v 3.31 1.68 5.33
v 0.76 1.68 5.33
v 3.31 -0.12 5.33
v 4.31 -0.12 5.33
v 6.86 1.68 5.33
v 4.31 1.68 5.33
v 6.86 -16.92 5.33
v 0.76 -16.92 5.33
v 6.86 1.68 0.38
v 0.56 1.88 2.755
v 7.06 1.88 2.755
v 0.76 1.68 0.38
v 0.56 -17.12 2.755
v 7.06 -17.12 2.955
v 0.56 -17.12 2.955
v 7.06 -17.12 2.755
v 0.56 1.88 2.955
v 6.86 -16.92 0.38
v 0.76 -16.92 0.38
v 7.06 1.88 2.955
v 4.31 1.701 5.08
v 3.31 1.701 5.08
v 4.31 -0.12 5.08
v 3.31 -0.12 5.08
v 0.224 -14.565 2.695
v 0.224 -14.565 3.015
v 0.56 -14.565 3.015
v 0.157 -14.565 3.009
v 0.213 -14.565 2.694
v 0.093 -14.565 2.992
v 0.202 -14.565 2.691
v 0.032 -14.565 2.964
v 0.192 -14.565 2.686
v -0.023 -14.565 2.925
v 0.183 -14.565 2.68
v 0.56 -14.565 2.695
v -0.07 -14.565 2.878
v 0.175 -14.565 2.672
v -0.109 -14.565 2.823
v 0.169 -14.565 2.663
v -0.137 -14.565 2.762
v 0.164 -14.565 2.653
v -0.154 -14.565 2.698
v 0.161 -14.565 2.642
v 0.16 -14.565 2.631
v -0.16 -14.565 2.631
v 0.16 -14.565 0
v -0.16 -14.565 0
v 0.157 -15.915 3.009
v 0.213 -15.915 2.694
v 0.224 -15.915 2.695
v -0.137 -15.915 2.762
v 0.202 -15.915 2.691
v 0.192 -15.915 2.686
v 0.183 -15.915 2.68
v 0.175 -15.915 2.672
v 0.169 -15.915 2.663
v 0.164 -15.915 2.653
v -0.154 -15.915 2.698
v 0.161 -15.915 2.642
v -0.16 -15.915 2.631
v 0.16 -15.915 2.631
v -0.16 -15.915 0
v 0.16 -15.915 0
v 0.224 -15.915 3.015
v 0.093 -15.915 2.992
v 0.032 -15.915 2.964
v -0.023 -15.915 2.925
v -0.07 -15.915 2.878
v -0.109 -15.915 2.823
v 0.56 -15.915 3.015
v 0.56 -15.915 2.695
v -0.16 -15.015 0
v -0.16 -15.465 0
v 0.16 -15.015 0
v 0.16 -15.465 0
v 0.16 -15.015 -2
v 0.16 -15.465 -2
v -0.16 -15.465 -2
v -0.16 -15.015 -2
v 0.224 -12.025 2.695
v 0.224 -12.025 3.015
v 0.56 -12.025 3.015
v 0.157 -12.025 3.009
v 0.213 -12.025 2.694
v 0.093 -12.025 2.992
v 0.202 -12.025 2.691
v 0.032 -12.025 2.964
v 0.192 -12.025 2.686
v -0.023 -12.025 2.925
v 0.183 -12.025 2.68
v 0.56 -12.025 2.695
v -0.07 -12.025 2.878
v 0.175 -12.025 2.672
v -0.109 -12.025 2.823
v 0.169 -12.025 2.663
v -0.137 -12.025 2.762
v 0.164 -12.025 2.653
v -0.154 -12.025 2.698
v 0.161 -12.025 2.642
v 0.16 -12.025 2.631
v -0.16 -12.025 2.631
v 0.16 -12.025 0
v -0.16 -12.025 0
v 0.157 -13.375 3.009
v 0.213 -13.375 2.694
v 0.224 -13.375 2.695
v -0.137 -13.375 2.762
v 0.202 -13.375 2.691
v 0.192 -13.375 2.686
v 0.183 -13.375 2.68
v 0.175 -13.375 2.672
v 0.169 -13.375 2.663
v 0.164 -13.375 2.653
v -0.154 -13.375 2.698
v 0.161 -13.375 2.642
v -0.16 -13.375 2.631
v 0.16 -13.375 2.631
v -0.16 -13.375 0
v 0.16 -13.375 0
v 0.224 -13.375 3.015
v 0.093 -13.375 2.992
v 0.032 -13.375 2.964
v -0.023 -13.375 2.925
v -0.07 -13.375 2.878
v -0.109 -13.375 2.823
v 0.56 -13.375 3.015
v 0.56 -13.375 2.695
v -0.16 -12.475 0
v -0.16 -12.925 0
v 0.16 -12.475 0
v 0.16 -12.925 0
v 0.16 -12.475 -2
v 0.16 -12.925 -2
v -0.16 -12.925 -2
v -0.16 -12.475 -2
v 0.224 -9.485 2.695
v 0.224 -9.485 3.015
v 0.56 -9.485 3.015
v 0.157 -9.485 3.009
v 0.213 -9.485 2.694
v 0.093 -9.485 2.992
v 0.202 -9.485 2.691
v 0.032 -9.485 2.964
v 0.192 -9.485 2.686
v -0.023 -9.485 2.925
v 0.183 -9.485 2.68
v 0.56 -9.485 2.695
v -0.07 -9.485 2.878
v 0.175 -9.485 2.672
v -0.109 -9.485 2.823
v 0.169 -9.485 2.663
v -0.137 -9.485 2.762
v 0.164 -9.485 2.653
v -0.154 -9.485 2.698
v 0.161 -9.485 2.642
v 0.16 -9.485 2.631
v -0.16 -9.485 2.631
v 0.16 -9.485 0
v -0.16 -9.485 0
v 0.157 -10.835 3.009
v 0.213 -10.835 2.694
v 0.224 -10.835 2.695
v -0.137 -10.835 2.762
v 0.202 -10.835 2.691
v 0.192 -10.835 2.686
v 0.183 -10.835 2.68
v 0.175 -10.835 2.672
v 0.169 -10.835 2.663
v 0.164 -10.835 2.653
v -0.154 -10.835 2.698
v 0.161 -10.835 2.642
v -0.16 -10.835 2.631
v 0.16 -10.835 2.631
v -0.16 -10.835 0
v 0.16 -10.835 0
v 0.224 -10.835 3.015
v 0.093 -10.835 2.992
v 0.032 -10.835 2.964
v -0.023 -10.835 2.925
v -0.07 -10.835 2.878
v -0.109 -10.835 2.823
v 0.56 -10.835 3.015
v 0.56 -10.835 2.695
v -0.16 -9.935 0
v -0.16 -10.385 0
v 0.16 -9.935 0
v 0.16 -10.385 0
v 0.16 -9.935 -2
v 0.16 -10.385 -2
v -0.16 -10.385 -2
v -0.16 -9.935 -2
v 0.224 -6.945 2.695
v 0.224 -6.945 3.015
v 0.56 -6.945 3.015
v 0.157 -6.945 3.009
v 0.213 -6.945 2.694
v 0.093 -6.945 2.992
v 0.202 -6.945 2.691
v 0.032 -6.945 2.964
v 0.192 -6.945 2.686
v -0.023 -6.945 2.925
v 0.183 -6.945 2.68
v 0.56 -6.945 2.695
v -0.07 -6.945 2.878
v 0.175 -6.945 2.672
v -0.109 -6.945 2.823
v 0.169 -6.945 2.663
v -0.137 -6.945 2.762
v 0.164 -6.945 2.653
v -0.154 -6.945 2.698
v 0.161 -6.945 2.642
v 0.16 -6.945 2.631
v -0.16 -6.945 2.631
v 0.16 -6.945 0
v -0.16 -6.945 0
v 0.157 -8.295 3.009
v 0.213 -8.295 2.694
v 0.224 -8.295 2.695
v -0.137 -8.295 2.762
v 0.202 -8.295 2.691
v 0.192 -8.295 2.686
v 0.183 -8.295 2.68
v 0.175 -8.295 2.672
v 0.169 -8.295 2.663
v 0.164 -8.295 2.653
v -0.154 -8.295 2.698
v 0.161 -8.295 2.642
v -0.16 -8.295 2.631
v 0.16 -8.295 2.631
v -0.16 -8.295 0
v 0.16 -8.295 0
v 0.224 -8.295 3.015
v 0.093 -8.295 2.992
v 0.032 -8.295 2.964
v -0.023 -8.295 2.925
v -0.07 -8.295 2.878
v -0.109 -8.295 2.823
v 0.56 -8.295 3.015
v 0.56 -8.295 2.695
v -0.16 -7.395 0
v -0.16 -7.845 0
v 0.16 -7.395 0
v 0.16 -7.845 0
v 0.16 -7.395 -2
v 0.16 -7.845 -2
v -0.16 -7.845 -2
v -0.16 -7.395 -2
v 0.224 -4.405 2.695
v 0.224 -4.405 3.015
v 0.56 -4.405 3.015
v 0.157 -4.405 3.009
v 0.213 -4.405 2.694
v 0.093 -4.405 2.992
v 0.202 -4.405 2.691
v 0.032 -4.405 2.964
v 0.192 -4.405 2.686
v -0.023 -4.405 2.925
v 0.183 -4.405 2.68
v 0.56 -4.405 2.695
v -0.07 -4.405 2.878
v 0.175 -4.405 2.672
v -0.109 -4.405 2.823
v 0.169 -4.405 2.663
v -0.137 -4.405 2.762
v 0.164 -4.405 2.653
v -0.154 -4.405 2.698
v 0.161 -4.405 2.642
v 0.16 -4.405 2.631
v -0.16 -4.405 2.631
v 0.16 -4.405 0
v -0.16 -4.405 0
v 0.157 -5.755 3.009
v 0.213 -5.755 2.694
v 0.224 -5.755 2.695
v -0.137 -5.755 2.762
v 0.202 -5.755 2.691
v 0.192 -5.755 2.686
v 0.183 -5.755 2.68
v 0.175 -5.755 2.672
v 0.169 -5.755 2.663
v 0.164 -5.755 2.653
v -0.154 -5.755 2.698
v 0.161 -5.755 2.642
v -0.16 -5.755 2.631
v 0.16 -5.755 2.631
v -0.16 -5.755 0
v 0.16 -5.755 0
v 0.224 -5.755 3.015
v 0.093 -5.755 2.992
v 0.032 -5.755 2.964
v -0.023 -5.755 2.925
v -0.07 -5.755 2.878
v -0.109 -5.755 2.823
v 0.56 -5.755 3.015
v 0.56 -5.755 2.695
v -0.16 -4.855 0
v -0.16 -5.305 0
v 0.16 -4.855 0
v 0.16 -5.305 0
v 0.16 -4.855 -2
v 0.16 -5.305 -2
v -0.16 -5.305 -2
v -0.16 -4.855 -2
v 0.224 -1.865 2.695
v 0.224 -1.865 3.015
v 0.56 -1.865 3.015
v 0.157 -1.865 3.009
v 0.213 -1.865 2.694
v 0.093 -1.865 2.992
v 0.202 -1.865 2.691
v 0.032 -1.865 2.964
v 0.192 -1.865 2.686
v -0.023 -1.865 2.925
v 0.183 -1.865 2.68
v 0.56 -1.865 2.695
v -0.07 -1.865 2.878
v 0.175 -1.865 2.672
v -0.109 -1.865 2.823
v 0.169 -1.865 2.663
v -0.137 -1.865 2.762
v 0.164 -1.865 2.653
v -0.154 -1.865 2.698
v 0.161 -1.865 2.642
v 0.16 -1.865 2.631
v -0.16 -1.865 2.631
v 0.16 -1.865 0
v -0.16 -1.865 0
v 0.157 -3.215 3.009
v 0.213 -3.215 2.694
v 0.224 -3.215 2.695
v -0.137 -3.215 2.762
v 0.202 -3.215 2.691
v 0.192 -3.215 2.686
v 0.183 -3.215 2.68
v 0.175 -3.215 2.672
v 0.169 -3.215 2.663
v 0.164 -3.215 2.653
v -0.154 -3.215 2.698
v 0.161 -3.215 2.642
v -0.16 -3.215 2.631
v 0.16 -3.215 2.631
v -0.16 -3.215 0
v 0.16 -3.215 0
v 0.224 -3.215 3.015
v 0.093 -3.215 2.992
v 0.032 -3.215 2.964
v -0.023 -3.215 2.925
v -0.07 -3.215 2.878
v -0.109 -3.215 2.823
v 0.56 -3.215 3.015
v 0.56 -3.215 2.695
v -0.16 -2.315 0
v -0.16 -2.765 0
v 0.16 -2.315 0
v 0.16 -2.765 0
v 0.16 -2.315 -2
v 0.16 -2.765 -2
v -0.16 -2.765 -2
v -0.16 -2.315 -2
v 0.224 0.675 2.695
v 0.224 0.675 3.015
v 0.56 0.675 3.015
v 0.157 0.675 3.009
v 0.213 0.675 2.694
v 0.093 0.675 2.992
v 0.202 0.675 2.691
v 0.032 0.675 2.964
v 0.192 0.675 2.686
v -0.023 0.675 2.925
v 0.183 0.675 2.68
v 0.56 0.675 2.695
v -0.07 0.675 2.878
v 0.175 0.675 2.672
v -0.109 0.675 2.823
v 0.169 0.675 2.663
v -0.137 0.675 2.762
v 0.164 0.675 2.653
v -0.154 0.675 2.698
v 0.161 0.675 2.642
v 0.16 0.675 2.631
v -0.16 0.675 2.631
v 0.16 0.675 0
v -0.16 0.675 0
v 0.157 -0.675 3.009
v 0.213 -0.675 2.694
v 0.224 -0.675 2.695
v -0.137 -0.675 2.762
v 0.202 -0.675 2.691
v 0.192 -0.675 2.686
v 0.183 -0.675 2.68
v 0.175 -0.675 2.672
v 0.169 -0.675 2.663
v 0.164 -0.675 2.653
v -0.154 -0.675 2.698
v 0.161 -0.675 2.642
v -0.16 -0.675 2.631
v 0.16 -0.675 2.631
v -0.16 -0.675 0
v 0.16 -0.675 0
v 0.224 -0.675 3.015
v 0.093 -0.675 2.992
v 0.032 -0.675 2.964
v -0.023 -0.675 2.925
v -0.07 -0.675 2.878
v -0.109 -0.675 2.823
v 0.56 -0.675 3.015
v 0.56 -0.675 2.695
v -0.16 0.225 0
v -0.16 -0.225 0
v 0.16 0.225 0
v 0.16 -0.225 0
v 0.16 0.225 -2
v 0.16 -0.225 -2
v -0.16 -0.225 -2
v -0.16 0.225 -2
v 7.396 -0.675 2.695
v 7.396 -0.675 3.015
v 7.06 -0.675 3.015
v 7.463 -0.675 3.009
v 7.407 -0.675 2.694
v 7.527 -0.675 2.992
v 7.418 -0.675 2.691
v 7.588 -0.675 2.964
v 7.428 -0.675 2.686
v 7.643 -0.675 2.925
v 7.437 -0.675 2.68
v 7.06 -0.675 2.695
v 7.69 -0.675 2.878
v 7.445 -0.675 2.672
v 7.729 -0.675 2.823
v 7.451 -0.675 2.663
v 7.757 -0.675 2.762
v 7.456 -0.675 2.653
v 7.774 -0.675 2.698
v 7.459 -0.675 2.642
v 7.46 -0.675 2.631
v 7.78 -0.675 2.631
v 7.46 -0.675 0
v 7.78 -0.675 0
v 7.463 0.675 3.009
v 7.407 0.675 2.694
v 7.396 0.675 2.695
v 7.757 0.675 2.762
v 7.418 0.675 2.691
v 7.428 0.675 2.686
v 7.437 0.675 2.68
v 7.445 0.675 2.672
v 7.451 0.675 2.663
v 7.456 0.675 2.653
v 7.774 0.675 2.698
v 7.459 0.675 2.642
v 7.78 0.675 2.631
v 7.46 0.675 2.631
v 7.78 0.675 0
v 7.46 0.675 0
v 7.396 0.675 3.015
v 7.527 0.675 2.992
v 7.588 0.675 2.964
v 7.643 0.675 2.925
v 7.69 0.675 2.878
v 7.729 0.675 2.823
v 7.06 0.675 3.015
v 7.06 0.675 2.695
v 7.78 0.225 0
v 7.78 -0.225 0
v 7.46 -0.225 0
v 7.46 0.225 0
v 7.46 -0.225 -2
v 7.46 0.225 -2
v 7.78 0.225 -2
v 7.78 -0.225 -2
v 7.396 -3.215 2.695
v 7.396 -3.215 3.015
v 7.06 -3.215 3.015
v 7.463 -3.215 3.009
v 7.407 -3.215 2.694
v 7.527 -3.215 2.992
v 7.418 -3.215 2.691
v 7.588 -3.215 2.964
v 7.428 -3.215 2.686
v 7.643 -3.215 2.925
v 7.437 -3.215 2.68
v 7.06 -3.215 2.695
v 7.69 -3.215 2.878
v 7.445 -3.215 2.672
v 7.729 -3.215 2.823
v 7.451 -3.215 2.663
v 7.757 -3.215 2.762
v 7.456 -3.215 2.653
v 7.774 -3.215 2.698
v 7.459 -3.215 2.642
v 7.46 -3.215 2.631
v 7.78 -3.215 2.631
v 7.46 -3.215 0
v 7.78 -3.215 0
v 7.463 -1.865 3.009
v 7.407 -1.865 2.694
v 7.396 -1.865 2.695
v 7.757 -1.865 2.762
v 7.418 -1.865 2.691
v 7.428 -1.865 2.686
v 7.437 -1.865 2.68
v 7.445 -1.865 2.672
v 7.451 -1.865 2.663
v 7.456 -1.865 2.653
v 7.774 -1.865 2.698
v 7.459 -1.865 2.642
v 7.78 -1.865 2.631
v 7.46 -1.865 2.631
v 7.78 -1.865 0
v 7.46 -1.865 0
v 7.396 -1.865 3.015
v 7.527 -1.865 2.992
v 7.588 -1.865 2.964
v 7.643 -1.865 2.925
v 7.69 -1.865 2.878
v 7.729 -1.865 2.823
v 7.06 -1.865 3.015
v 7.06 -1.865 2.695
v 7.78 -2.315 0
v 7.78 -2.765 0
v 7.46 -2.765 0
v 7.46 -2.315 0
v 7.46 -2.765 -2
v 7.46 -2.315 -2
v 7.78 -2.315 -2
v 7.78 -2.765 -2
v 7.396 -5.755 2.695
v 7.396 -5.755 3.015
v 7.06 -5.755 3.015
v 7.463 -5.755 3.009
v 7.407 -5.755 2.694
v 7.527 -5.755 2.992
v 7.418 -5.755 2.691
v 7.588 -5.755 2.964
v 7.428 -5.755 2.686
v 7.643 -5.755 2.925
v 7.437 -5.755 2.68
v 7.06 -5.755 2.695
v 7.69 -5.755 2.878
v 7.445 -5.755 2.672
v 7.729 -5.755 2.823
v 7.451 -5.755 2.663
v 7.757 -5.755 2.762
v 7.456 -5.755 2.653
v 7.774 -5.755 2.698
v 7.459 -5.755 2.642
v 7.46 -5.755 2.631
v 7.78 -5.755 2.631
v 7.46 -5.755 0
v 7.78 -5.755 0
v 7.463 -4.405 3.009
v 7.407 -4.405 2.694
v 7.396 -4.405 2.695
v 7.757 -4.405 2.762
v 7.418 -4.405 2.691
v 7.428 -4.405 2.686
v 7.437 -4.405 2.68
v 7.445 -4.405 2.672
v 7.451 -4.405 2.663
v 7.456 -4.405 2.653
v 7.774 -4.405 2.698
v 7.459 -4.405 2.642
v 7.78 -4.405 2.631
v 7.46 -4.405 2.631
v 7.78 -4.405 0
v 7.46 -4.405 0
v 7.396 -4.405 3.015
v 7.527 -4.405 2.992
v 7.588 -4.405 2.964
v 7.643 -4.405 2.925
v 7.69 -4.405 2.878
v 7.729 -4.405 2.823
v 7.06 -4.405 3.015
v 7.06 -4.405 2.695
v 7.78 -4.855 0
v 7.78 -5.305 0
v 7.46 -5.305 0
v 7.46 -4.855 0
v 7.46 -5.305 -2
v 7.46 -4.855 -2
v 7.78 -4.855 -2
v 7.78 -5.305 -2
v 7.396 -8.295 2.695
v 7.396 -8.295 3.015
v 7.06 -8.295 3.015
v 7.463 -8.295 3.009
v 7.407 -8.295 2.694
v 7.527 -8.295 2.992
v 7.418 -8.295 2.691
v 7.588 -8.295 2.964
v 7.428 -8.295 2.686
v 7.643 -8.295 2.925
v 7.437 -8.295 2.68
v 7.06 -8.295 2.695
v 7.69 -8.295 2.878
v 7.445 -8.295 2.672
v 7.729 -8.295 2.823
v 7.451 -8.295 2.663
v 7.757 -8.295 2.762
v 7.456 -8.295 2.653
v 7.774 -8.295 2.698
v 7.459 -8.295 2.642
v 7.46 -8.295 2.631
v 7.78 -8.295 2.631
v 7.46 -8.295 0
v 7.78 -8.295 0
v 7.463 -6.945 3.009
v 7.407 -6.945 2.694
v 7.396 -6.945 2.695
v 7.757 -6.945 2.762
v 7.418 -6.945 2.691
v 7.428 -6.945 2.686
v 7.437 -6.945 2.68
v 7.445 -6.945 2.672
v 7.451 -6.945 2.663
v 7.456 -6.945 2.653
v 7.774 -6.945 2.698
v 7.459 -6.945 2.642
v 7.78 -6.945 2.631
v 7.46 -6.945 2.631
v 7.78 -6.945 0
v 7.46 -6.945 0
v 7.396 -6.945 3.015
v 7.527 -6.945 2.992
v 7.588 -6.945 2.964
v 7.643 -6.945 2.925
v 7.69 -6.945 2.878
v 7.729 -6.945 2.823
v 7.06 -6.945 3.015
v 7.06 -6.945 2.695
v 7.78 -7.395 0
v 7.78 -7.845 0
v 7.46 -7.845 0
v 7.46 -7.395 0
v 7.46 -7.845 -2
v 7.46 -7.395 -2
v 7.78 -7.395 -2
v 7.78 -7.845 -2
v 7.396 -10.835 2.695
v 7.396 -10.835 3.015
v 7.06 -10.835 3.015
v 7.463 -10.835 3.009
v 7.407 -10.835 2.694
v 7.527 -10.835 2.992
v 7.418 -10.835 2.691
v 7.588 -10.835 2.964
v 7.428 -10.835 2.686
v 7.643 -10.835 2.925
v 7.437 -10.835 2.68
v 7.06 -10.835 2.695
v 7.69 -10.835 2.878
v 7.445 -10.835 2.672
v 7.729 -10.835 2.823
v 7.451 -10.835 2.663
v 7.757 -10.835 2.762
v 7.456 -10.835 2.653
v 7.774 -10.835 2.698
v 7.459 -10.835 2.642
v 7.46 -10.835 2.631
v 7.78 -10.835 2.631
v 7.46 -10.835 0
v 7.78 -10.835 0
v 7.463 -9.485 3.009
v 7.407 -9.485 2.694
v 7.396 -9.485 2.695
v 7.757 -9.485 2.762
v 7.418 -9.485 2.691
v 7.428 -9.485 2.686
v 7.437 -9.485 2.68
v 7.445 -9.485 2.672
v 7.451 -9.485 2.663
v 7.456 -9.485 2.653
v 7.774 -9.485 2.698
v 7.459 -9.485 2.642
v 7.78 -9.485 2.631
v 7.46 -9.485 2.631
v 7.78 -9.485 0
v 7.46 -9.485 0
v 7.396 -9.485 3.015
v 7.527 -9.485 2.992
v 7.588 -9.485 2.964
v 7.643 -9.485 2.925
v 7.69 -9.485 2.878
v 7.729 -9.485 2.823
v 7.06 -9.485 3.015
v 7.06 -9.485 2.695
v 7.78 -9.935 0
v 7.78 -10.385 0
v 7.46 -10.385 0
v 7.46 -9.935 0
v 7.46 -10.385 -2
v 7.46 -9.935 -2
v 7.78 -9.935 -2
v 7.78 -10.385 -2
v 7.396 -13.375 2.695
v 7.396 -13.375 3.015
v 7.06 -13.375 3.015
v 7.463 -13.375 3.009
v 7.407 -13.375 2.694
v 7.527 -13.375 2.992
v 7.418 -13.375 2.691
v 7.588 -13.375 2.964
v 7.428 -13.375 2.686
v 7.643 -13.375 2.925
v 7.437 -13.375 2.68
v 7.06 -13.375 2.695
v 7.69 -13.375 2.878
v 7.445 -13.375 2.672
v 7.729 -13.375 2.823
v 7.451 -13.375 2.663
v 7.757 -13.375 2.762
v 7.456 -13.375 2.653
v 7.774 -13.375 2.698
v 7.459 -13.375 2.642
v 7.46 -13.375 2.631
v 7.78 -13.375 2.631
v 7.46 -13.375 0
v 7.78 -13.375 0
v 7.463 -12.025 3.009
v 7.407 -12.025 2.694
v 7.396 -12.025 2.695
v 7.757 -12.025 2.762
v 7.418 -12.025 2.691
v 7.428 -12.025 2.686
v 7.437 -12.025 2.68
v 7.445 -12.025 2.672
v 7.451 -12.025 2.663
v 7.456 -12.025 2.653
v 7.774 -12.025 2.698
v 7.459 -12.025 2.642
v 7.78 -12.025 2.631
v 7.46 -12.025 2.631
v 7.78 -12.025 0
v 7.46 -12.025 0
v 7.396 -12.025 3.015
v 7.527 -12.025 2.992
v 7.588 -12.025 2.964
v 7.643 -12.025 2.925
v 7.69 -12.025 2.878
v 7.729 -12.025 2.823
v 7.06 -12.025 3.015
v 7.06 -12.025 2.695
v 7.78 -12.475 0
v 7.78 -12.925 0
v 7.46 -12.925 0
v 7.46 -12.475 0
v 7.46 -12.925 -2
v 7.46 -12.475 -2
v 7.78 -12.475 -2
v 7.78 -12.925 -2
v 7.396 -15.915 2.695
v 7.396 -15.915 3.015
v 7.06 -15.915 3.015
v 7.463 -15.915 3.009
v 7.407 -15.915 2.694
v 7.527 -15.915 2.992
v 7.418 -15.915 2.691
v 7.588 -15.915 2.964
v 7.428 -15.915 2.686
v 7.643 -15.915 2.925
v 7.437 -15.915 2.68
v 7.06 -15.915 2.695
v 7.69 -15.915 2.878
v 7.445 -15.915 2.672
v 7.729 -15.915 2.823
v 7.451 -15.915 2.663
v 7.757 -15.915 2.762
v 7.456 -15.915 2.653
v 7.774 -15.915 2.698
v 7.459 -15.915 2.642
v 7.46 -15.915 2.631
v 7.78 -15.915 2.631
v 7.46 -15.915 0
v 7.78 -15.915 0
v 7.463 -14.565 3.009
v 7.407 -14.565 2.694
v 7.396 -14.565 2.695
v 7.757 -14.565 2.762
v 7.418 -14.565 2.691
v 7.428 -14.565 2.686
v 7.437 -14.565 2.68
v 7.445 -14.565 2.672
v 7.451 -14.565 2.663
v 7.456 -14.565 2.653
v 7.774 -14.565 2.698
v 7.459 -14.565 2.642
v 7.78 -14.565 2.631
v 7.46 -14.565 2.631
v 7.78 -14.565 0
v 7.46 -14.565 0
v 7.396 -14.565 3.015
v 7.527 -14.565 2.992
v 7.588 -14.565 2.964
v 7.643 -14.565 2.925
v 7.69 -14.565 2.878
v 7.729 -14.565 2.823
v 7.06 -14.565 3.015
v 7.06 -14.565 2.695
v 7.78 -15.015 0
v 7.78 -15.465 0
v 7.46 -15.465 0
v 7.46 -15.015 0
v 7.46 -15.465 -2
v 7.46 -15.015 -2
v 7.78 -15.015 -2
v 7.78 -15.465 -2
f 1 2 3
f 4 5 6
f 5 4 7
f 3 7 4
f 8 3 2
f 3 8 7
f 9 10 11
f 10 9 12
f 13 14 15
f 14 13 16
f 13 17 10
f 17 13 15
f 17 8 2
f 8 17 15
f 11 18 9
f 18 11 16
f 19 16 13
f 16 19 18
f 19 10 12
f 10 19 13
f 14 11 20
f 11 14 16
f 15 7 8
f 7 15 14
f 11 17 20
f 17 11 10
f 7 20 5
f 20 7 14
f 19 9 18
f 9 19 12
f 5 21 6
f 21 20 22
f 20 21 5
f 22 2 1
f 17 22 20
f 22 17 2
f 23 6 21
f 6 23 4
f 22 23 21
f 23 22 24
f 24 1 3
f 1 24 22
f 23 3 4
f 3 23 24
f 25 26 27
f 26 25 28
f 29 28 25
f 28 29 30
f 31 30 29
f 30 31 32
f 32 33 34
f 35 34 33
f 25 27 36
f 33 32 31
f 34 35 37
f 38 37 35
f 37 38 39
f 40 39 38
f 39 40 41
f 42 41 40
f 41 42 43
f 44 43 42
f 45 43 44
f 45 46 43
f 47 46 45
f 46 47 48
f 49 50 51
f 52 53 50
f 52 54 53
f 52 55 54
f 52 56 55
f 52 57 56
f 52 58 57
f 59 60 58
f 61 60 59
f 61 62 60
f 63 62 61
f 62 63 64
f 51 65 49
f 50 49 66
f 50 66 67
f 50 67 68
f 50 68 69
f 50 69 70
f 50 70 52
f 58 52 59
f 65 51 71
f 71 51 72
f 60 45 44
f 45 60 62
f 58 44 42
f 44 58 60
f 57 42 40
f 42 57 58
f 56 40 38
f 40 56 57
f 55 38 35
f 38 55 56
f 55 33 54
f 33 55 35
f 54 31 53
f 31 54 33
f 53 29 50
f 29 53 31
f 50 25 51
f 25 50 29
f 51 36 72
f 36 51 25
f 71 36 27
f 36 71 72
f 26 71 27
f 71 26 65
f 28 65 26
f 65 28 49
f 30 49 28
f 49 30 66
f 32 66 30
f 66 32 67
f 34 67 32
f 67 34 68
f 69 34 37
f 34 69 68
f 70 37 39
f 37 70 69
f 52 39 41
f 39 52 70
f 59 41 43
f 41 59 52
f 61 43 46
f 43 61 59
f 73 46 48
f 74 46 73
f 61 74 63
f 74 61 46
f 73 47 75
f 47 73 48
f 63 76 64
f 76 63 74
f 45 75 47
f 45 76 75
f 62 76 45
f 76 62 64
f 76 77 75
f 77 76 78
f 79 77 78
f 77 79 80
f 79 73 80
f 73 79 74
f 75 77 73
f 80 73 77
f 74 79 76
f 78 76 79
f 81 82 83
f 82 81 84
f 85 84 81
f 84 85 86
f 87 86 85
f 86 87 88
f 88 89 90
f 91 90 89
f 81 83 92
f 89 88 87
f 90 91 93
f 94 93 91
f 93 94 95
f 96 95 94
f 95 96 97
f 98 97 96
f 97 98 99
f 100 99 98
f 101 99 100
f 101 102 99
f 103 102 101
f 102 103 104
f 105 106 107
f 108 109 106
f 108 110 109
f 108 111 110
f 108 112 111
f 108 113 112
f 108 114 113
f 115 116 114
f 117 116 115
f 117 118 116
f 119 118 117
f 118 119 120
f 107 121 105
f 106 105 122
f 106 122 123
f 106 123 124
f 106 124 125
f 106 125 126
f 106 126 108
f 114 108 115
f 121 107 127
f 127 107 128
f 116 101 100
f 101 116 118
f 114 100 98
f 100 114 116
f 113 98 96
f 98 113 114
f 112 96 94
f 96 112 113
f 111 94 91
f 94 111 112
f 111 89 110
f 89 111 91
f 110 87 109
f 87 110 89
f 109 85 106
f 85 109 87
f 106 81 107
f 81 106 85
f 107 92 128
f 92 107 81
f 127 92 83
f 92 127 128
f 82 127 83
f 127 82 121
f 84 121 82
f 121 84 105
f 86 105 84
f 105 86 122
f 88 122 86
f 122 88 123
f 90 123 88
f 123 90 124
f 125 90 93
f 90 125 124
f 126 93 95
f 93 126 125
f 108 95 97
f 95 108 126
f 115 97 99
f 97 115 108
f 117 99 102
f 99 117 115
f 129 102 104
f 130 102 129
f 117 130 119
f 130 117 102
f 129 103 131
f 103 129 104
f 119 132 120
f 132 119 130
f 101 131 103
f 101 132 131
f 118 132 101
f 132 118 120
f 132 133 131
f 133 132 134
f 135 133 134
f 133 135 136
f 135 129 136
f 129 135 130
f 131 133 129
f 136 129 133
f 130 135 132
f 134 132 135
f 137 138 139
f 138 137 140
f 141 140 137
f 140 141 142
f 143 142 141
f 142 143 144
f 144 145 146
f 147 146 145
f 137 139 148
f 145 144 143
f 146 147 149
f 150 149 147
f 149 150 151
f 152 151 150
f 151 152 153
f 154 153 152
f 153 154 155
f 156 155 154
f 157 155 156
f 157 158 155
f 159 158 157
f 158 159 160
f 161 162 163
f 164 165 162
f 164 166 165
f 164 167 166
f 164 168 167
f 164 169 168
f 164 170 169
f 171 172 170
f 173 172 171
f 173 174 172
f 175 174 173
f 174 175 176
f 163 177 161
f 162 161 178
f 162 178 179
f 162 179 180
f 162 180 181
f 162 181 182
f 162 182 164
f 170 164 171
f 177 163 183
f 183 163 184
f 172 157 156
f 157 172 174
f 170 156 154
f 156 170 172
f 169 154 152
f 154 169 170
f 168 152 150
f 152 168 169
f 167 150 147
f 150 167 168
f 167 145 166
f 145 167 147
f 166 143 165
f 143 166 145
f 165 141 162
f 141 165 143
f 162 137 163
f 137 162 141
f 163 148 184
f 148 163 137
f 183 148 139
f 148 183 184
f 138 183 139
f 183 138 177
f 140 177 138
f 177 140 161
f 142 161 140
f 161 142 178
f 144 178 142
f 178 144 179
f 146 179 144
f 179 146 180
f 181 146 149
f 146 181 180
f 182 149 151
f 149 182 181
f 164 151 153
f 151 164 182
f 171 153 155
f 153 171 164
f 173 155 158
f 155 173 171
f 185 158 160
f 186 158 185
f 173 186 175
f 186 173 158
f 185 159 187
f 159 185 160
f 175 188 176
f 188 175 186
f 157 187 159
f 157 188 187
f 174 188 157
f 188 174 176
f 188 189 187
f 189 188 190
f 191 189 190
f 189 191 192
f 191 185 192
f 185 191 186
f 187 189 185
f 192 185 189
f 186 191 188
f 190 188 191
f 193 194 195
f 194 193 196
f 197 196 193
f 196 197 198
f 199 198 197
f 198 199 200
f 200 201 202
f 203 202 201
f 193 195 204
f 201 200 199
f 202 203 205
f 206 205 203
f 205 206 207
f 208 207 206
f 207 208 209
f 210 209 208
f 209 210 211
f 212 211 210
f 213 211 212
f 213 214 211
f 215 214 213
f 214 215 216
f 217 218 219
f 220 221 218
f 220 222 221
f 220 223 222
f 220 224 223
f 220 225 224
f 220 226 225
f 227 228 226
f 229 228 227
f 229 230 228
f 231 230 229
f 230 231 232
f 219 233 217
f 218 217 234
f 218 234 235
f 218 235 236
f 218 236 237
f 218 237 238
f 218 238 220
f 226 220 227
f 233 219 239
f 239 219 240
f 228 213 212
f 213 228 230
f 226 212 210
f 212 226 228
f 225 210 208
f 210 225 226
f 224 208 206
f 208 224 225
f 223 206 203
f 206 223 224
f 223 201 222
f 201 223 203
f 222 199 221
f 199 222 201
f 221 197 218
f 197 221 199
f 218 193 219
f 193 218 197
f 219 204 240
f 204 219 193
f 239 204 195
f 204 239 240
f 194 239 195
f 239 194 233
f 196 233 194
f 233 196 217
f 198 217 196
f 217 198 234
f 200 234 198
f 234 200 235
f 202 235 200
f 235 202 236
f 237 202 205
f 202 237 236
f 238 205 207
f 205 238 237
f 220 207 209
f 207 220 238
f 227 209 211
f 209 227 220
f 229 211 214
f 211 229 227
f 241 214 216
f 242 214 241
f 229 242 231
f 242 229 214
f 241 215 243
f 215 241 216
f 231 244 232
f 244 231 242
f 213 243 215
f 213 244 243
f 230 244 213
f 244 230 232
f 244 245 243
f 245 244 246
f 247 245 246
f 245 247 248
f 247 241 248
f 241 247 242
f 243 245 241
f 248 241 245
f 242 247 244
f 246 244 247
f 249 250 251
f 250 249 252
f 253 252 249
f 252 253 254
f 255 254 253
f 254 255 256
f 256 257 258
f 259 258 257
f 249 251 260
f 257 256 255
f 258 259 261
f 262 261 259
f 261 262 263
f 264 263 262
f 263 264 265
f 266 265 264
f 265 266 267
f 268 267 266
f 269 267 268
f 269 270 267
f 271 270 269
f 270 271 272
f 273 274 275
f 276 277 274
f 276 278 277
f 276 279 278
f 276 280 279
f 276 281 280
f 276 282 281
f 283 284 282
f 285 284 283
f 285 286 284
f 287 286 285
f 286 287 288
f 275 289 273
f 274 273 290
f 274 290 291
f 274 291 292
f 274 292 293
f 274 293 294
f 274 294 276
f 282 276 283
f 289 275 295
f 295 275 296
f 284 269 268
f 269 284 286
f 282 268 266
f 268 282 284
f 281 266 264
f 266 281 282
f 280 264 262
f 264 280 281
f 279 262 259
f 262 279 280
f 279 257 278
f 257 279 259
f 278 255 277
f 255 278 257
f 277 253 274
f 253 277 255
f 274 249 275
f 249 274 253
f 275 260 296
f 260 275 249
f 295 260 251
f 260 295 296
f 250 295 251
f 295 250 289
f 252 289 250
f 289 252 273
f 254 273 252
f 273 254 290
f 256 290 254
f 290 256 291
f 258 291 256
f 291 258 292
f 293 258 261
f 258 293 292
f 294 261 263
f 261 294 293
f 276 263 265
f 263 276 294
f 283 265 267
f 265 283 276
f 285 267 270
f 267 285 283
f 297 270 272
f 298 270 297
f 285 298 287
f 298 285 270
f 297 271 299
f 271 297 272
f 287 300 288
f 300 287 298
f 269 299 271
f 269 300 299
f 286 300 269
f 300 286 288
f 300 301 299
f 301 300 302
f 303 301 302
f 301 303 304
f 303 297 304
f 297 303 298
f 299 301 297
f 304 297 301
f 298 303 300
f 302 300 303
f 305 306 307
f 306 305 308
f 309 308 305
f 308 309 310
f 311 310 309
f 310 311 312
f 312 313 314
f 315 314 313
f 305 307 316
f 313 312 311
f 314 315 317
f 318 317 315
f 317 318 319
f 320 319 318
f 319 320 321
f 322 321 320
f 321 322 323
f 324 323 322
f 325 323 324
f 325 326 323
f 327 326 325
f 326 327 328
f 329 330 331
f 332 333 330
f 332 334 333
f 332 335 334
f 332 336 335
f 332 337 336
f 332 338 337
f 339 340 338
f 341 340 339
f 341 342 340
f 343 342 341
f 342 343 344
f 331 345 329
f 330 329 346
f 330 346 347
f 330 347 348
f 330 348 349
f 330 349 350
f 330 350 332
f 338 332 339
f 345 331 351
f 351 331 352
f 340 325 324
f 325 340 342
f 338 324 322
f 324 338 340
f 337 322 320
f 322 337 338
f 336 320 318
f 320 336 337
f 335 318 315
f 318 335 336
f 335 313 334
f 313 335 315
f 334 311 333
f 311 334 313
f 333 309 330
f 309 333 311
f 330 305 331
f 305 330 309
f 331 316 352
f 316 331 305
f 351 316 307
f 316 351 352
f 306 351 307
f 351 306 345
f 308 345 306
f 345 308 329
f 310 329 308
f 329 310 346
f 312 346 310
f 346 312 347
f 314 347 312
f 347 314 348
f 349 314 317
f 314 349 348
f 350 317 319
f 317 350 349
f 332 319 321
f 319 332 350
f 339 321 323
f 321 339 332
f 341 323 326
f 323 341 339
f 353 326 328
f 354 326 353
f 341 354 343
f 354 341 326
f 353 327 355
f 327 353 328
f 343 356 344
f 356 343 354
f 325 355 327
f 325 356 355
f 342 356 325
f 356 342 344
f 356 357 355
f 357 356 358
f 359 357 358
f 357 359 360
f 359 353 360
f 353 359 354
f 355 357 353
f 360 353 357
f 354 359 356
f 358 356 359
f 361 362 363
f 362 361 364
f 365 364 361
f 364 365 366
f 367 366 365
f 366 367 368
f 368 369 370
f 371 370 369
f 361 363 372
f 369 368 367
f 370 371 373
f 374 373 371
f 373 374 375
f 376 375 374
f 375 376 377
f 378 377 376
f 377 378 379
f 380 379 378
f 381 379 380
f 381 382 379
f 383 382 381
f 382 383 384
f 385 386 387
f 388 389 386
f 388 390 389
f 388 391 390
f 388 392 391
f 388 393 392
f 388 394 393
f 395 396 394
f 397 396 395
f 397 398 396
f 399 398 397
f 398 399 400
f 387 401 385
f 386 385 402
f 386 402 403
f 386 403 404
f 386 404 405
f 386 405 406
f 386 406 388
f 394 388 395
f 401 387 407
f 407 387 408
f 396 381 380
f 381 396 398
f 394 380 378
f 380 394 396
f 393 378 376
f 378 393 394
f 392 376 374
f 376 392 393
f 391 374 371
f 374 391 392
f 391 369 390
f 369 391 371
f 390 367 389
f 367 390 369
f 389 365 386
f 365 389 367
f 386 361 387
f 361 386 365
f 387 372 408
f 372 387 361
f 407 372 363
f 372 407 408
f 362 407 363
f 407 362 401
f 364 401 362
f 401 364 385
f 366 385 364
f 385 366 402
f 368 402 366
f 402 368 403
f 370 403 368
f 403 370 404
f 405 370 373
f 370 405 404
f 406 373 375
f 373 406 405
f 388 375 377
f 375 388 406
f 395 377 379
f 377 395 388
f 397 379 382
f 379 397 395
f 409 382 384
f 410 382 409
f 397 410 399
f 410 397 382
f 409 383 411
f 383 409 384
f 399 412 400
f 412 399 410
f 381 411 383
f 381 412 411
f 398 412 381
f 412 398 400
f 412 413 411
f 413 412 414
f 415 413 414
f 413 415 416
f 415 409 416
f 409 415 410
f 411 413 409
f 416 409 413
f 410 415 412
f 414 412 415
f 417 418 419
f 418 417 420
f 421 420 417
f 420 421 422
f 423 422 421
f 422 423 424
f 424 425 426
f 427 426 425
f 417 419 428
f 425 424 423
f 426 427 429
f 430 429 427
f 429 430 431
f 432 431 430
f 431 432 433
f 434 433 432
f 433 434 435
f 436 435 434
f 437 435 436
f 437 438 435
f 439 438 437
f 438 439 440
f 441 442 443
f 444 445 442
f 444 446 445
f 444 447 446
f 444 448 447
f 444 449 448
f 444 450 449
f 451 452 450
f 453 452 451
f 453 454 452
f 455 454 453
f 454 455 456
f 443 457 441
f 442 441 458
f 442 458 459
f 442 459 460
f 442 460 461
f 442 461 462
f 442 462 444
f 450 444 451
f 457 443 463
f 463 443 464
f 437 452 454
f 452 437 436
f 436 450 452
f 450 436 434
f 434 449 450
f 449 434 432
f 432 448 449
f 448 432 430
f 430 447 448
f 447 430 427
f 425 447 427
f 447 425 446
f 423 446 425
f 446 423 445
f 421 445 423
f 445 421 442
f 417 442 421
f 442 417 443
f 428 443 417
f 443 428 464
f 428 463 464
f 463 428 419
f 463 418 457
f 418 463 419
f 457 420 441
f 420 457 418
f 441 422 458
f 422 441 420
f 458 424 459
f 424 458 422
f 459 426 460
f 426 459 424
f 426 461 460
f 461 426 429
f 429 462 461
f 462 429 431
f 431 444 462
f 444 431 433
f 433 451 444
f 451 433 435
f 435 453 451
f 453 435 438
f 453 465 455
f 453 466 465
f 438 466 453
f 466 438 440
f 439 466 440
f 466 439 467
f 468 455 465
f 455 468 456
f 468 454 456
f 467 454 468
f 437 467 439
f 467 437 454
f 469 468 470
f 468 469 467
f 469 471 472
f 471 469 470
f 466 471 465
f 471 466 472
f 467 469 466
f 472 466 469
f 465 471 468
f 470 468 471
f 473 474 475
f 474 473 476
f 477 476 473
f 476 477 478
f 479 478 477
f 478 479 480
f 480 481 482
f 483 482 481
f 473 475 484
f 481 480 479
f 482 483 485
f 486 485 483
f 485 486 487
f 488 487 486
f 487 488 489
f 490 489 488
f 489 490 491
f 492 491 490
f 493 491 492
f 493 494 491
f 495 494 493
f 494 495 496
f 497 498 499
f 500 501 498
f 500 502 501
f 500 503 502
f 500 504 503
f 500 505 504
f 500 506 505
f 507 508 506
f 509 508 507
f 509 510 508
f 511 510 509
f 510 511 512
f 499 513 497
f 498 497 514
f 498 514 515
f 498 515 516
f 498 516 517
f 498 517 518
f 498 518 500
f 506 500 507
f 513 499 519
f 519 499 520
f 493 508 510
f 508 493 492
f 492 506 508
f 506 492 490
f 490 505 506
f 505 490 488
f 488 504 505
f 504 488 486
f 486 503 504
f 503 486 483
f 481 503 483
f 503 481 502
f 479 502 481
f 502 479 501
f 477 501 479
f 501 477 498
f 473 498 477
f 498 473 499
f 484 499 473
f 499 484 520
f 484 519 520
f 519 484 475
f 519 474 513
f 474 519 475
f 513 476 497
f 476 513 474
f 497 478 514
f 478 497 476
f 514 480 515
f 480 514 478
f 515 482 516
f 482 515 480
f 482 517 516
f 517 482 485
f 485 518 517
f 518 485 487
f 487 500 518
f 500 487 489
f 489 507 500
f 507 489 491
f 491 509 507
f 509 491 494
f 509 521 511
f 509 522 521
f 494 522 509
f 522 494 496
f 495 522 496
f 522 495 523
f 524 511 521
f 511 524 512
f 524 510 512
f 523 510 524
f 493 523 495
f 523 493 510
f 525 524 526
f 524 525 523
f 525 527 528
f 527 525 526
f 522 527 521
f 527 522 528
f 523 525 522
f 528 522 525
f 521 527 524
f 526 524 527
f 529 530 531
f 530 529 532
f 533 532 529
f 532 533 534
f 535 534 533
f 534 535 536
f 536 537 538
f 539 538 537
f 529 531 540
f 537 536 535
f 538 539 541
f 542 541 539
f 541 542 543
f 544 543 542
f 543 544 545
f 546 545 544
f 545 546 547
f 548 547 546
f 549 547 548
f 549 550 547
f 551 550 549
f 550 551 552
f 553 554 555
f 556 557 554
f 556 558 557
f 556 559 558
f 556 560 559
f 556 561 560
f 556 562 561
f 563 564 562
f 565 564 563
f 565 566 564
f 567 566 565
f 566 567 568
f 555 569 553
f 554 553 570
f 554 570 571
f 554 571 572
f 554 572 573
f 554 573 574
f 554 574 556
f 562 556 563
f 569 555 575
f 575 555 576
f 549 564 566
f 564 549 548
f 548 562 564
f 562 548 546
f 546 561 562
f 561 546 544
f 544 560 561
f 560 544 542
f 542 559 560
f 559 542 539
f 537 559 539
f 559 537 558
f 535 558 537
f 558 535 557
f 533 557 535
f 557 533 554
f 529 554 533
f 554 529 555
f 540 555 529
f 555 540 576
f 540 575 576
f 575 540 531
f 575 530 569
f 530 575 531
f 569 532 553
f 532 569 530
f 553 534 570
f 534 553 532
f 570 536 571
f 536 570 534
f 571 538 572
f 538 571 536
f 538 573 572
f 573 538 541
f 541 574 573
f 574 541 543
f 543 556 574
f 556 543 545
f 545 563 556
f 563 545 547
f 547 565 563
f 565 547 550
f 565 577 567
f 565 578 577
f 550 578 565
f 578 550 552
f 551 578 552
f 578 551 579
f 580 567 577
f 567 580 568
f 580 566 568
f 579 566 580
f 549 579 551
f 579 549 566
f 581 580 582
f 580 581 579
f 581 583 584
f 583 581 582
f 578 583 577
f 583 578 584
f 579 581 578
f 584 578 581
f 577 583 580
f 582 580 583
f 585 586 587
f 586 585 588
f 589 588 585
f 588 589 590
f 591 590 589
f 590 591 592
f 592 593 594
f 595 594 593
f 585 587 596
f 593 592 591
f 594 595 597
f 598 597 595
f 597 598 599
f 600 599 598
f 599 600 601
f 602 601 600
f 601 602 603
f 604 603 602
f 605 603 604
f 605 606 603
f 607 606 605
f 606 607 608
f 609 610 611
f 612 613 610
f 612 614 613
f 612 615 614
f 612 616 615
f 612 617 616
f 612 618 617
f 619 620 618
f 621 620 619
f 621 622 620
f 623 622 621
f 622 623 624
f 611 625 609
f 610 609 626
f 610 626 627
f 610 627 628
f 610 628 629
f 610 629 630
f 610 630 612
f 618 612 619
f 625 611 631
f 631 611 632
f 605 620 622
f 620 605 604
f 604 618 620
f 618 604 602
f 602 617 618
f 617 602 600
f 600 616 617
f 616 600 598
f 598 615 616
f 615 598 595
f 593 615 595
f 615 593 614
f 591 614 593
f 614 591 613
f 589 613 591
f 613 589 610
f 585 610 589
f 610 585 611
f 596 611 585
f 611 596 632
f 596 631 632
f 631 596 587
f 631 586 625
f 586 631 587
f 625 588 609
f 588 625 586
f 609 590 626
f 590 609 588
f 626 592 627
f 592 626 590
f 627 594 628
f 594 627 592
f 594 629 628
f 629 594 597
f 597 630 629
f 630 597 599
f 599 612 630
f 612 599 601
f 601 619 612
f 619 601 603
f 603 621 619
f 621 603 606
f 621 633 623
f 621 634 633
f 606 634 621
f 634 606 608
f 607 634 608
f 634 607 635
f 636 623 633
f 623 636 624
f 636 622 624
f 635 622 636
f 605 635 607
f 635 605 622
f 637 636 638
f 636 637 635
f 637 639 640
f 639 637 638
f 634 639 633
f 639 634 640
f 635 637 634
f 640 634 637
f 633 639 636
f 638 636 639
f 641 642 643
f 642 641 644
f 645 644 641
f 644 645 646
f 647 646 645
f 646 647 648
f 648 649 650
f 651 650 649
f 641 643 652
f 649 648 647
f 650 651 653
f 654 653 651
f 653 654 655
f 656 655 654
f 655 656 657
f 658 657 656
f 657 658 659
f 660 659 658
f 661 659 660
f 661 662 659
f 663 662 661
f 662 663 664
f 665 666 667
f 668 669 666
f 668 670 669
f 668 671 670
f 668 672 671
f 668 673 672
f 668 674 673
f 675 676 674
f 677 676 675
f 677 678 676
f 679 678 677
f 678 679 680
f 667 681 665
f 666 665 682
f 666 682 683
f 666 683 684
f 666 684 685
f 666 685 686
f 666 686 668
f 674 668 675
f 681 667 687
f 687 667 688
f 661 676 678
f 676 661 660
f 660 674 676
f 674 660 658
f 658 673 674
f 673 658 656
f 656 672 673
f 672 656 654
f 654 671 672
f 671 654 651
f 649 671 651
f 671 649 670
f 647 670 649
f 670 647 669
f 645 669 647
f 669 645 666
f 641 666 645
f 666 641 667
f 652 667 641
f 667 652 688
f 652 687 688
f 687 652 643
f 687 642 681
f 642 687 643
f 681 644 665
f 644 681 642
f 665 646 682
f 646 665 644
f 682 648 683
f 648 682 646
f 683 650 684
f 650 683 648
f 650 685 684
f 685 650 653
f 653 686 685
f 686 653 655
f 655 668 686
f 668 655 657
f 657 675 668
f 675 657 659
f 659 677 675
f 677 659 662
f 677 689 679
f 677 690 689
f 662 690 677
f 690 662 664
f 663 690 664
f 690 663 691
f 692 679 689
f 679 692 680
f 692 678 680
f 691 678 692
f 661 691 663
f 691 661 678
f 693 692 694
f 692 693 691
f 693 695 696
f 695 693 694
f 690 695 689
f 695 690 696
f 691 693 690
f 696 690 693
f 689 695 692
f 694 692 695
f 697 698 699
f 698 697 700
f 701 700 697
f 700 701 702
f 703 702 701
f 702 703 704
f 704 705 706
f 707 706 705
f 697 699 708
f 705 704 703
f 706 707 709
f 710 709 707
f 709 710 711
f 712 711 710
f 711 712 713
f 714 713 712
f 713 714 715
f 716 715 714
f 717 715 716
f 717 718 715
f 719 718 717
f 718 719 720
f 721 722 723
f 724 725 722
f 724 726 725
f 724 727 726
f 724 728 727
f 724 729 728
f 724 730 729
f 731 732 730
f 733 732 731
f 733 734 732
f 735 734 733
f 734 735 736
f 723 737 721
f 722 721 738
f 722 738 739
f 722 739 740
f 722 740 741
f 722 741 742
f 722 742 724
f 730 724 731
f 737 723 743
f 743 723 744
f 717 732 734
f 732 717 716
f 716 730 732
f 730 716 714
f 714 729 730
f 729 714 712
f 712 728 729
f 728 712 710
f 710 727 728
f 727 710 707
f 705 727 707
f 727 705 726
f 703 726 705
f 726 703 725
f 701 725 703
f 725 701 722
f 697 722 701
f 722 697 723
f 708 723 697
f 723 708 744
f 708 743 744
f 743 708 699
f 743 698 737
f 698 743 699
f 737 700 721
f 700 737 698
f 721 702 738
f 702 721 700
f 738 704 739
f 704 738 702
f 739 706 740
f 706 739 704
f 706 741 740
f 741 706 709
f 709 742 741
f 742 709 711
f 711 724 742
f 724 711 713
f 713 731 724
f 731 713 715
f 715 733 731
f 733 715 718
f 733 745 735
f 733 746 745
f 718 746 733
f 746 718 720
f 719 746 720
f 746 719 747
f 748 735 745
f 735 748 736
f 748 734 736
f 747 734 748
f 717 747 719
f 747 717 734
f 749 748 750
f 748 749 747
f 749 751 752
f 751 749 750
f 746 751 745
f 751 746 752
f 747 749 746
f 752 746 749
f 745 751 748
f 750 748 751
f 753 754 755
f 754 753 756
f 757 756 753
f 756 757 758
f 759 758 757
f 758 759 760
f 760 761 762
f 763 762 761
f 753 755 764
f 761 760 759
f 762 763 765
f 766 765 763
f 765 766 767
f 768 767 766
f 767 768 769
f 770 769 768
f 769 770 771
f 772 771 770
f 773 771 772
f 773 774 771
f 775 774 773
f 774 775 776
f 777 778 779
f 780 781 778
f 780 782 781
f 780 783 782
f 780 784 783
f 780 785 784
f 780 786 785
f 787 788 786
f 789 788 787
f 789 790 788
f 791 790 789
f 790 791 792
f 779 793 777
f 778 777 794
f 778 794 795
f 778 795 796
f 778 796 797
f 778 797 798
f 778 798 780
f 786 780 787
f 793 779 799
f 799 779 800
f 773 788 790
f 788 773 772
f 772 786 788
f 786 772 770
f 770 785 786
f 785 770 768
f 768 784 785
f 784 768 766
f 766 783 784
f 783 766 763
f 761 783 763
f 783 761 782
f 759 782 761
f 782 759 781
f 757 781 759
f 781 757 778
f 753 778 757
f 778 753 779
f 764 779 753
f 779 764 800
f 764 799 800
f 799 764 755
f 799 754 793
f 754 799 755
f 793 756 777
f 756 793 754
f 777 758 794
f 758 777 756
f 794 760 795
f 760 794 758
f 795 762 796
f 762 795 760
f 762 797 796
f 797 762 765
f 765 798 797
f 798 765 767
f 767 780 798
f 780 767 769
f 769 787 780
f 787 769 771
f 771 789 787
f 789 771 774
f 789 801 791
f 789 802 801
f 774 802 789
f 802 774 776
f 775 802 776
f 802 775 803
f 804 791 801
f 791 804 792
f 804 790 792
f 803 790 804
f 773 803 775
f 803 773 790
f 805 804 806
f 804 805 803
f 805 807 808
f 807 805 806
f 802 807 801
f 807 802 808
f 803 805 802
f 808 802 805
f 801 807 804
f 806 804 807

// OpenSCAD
// file: proto/dip.scad
/*
OpenSCAD Model:  DIP package

Parameters:
  N  - Number of pins
  P  - Pitch
  TC - Width
  W  - Width of pin
  T  - Thickness of pin
  A  - Body length
  B  - Body width
  H  - Body height
  K  - Elevation
  h  - Pin length
  pincolor - color of pin
  bodycolor - color of plastic body
  simple - 0 = realistic model, 1 = simplified model
*/

module dip(
	N=14,
	P=2.54,
	TC=7.62,
	W=0.45,
	H=5.33,
	T=0.375,
	A=6.35,
	B=19.2,
	K=0.38,
	h=2.0,
	pincolor=[0.9,0.9,0.9],
	bodycolor=[0.2,0.2,0.2],
	simple=0
) {

	module dippinblock()	{
		q=[0,0.173648178,0.342020143,0.5,0.64278761,0.766044443,0.866025404,0.939692621,0.984807753,1];

		x=0.01;
		t2=T/2;
		hk=(H-K)/2+K;
		dt=1.2*T;
		dt2=dt-T;
		cx=dt-t2;
		cy= hk+t2-dt;
		color(pincolor) for (i=[0:(N/2)-1]) {
			 union () {
					translate ([0,-((N/2)-1)/2*P+i*P+1.5*W,0]) rotate(90,[1,0,0]) linear_extrude(height=3*W) {
					if (simple) {
						polygon([
							[-t2,0], [-t2, hk+t2-dt], 	[dt-t2,hk+t2], [(TC-A)/2,hk+t2],[(TC-A)/2,hk-t2], [dt-t2,hk-t2], [t2,hk+t2-dt], [t2,0]]
						);
					} else {
						 polygon([
							[-t2,0],
							[cx-dt*q[9],dt*q[0]+cy],[cx-dt*q[8],dt*q[1]+cy],[cx-dt*q[7],dt*q[2]+cy],[cx-dt*q[6],dt*q[3]+cy],[cx-dt*q[5],dt*q[4]+cy],
							[cx-dt*q[4],dt*q[5]+cy],[cx-dt*q[3],dt*q[6]+cy],[cx-dt*q[2],dt*q[7]+cy],[cx-dt*q[1],dt*q[8]+cy],[cx-dt*q[0],dt*q[9]+cy],
							[dt-t2,hk+t2],
							[(TC-A)/2,hk+t2],[(TC-A)/2,hk-t2],
							[cx-dt2*q[0],dt2*q[9]+cy],[cx-dt2*q[1],dt2*q[8]+cy],[cx-dt2*q[2],dt2*q[7]+cy],[cx-dt2*q[3],dt2*q[6]+cy],[cx-dt2*q[4],dt2*q[5]+cy],
							[cx-dt2*q[5],dt2*q[4]+cy],[cx-dt2*q[6],dt2*q[3]+cy],[cx-dt2*q[7],dt2*q[2]+cy],[cx-dt2*q[8],dt2*q[1]+cy],[cx-dt2*q[9],dt2*q[0]+cy],
							[t2,0]]
						);
					}
					}
				translate ([0,-((N/2)-1)/2*P+i*P,-1]) cube([T,W,2],center=true);
			}
		}
	}
	color(bodycolor) {
		translate([0,0,(H-K)/2+K]) {
			difference() {
			if (simple) {
				cube([A,B,H-K],center=true);
			} else {
				polyhedron(
					[[-A/2+0.2,B/2-0.2,(H-K)/2],[A/2-0.2,B/2-0.2,(H-K)/2],[A/2-0.2,-B/2+0.2,(H-K)/2],[-A/2+0.2,-B/2+0.2,(H-K)/2],
					 [-A/2,B/2,0.1],[A/2,B/2,0.1],[A/2,-B/2,0.1],[-A/2,-B/2,0.1],
					 [-A/2,B/2,-0.1],[A/2,B/2,-0.1],[A/2,-B/2,-0.1],[-A/2,-B/2,-0.1],
					 [-A/2+0.2,B/2-0.2,-(H-K)/2],[A/2-0.2,B/2-0.2,-(H-K)/2],[A/2-0.2,-B/2+0.2,-(H-K)/2],[-A/2+0.2,-B/2+0.2,-(H-K)/2]],
					[
					[0,1,2],[2,3,0],[14,13,12],[12,15,14],
					[0,4,5],[5,1,0],[1,5,6],[6,2,1],[2,6,7],[7,3,2],[3,7,4],[4,0,3],
					[4,8,9],[9,5,4],[5,9,10],[10,6,5],[6,10,11],[11,7,6],[11,8,4],[4,7,11],
					[8,12,13],[13,9,8],[9,13,14],[14,10,9],[10,14,15],[15,11,10],[11,15,12],[12,8,11],
					]
				);
			}
			translate([0,B/2-1,(H-K)/2]) cube([1,2,0.5],center=true);
			}
		}
	}

	translate([-TC/2,0,0]) dippinblock();
	translate([TC/2,0,0]) rotate(180,[0,0,1]) dippinblock();
}
// main file
/*

DIP 14, 0.300mil

*/

include <proto/dip.scad>

translate ([3.81,-7.62,0]) dip(
	N=14,
	P=2.54,
	TC=7.62,
	W=0.45,
	T=0.32,
	A=6.5,
	B=19,
	H=5.33,
	K=0.38,
	h=3.55
);
